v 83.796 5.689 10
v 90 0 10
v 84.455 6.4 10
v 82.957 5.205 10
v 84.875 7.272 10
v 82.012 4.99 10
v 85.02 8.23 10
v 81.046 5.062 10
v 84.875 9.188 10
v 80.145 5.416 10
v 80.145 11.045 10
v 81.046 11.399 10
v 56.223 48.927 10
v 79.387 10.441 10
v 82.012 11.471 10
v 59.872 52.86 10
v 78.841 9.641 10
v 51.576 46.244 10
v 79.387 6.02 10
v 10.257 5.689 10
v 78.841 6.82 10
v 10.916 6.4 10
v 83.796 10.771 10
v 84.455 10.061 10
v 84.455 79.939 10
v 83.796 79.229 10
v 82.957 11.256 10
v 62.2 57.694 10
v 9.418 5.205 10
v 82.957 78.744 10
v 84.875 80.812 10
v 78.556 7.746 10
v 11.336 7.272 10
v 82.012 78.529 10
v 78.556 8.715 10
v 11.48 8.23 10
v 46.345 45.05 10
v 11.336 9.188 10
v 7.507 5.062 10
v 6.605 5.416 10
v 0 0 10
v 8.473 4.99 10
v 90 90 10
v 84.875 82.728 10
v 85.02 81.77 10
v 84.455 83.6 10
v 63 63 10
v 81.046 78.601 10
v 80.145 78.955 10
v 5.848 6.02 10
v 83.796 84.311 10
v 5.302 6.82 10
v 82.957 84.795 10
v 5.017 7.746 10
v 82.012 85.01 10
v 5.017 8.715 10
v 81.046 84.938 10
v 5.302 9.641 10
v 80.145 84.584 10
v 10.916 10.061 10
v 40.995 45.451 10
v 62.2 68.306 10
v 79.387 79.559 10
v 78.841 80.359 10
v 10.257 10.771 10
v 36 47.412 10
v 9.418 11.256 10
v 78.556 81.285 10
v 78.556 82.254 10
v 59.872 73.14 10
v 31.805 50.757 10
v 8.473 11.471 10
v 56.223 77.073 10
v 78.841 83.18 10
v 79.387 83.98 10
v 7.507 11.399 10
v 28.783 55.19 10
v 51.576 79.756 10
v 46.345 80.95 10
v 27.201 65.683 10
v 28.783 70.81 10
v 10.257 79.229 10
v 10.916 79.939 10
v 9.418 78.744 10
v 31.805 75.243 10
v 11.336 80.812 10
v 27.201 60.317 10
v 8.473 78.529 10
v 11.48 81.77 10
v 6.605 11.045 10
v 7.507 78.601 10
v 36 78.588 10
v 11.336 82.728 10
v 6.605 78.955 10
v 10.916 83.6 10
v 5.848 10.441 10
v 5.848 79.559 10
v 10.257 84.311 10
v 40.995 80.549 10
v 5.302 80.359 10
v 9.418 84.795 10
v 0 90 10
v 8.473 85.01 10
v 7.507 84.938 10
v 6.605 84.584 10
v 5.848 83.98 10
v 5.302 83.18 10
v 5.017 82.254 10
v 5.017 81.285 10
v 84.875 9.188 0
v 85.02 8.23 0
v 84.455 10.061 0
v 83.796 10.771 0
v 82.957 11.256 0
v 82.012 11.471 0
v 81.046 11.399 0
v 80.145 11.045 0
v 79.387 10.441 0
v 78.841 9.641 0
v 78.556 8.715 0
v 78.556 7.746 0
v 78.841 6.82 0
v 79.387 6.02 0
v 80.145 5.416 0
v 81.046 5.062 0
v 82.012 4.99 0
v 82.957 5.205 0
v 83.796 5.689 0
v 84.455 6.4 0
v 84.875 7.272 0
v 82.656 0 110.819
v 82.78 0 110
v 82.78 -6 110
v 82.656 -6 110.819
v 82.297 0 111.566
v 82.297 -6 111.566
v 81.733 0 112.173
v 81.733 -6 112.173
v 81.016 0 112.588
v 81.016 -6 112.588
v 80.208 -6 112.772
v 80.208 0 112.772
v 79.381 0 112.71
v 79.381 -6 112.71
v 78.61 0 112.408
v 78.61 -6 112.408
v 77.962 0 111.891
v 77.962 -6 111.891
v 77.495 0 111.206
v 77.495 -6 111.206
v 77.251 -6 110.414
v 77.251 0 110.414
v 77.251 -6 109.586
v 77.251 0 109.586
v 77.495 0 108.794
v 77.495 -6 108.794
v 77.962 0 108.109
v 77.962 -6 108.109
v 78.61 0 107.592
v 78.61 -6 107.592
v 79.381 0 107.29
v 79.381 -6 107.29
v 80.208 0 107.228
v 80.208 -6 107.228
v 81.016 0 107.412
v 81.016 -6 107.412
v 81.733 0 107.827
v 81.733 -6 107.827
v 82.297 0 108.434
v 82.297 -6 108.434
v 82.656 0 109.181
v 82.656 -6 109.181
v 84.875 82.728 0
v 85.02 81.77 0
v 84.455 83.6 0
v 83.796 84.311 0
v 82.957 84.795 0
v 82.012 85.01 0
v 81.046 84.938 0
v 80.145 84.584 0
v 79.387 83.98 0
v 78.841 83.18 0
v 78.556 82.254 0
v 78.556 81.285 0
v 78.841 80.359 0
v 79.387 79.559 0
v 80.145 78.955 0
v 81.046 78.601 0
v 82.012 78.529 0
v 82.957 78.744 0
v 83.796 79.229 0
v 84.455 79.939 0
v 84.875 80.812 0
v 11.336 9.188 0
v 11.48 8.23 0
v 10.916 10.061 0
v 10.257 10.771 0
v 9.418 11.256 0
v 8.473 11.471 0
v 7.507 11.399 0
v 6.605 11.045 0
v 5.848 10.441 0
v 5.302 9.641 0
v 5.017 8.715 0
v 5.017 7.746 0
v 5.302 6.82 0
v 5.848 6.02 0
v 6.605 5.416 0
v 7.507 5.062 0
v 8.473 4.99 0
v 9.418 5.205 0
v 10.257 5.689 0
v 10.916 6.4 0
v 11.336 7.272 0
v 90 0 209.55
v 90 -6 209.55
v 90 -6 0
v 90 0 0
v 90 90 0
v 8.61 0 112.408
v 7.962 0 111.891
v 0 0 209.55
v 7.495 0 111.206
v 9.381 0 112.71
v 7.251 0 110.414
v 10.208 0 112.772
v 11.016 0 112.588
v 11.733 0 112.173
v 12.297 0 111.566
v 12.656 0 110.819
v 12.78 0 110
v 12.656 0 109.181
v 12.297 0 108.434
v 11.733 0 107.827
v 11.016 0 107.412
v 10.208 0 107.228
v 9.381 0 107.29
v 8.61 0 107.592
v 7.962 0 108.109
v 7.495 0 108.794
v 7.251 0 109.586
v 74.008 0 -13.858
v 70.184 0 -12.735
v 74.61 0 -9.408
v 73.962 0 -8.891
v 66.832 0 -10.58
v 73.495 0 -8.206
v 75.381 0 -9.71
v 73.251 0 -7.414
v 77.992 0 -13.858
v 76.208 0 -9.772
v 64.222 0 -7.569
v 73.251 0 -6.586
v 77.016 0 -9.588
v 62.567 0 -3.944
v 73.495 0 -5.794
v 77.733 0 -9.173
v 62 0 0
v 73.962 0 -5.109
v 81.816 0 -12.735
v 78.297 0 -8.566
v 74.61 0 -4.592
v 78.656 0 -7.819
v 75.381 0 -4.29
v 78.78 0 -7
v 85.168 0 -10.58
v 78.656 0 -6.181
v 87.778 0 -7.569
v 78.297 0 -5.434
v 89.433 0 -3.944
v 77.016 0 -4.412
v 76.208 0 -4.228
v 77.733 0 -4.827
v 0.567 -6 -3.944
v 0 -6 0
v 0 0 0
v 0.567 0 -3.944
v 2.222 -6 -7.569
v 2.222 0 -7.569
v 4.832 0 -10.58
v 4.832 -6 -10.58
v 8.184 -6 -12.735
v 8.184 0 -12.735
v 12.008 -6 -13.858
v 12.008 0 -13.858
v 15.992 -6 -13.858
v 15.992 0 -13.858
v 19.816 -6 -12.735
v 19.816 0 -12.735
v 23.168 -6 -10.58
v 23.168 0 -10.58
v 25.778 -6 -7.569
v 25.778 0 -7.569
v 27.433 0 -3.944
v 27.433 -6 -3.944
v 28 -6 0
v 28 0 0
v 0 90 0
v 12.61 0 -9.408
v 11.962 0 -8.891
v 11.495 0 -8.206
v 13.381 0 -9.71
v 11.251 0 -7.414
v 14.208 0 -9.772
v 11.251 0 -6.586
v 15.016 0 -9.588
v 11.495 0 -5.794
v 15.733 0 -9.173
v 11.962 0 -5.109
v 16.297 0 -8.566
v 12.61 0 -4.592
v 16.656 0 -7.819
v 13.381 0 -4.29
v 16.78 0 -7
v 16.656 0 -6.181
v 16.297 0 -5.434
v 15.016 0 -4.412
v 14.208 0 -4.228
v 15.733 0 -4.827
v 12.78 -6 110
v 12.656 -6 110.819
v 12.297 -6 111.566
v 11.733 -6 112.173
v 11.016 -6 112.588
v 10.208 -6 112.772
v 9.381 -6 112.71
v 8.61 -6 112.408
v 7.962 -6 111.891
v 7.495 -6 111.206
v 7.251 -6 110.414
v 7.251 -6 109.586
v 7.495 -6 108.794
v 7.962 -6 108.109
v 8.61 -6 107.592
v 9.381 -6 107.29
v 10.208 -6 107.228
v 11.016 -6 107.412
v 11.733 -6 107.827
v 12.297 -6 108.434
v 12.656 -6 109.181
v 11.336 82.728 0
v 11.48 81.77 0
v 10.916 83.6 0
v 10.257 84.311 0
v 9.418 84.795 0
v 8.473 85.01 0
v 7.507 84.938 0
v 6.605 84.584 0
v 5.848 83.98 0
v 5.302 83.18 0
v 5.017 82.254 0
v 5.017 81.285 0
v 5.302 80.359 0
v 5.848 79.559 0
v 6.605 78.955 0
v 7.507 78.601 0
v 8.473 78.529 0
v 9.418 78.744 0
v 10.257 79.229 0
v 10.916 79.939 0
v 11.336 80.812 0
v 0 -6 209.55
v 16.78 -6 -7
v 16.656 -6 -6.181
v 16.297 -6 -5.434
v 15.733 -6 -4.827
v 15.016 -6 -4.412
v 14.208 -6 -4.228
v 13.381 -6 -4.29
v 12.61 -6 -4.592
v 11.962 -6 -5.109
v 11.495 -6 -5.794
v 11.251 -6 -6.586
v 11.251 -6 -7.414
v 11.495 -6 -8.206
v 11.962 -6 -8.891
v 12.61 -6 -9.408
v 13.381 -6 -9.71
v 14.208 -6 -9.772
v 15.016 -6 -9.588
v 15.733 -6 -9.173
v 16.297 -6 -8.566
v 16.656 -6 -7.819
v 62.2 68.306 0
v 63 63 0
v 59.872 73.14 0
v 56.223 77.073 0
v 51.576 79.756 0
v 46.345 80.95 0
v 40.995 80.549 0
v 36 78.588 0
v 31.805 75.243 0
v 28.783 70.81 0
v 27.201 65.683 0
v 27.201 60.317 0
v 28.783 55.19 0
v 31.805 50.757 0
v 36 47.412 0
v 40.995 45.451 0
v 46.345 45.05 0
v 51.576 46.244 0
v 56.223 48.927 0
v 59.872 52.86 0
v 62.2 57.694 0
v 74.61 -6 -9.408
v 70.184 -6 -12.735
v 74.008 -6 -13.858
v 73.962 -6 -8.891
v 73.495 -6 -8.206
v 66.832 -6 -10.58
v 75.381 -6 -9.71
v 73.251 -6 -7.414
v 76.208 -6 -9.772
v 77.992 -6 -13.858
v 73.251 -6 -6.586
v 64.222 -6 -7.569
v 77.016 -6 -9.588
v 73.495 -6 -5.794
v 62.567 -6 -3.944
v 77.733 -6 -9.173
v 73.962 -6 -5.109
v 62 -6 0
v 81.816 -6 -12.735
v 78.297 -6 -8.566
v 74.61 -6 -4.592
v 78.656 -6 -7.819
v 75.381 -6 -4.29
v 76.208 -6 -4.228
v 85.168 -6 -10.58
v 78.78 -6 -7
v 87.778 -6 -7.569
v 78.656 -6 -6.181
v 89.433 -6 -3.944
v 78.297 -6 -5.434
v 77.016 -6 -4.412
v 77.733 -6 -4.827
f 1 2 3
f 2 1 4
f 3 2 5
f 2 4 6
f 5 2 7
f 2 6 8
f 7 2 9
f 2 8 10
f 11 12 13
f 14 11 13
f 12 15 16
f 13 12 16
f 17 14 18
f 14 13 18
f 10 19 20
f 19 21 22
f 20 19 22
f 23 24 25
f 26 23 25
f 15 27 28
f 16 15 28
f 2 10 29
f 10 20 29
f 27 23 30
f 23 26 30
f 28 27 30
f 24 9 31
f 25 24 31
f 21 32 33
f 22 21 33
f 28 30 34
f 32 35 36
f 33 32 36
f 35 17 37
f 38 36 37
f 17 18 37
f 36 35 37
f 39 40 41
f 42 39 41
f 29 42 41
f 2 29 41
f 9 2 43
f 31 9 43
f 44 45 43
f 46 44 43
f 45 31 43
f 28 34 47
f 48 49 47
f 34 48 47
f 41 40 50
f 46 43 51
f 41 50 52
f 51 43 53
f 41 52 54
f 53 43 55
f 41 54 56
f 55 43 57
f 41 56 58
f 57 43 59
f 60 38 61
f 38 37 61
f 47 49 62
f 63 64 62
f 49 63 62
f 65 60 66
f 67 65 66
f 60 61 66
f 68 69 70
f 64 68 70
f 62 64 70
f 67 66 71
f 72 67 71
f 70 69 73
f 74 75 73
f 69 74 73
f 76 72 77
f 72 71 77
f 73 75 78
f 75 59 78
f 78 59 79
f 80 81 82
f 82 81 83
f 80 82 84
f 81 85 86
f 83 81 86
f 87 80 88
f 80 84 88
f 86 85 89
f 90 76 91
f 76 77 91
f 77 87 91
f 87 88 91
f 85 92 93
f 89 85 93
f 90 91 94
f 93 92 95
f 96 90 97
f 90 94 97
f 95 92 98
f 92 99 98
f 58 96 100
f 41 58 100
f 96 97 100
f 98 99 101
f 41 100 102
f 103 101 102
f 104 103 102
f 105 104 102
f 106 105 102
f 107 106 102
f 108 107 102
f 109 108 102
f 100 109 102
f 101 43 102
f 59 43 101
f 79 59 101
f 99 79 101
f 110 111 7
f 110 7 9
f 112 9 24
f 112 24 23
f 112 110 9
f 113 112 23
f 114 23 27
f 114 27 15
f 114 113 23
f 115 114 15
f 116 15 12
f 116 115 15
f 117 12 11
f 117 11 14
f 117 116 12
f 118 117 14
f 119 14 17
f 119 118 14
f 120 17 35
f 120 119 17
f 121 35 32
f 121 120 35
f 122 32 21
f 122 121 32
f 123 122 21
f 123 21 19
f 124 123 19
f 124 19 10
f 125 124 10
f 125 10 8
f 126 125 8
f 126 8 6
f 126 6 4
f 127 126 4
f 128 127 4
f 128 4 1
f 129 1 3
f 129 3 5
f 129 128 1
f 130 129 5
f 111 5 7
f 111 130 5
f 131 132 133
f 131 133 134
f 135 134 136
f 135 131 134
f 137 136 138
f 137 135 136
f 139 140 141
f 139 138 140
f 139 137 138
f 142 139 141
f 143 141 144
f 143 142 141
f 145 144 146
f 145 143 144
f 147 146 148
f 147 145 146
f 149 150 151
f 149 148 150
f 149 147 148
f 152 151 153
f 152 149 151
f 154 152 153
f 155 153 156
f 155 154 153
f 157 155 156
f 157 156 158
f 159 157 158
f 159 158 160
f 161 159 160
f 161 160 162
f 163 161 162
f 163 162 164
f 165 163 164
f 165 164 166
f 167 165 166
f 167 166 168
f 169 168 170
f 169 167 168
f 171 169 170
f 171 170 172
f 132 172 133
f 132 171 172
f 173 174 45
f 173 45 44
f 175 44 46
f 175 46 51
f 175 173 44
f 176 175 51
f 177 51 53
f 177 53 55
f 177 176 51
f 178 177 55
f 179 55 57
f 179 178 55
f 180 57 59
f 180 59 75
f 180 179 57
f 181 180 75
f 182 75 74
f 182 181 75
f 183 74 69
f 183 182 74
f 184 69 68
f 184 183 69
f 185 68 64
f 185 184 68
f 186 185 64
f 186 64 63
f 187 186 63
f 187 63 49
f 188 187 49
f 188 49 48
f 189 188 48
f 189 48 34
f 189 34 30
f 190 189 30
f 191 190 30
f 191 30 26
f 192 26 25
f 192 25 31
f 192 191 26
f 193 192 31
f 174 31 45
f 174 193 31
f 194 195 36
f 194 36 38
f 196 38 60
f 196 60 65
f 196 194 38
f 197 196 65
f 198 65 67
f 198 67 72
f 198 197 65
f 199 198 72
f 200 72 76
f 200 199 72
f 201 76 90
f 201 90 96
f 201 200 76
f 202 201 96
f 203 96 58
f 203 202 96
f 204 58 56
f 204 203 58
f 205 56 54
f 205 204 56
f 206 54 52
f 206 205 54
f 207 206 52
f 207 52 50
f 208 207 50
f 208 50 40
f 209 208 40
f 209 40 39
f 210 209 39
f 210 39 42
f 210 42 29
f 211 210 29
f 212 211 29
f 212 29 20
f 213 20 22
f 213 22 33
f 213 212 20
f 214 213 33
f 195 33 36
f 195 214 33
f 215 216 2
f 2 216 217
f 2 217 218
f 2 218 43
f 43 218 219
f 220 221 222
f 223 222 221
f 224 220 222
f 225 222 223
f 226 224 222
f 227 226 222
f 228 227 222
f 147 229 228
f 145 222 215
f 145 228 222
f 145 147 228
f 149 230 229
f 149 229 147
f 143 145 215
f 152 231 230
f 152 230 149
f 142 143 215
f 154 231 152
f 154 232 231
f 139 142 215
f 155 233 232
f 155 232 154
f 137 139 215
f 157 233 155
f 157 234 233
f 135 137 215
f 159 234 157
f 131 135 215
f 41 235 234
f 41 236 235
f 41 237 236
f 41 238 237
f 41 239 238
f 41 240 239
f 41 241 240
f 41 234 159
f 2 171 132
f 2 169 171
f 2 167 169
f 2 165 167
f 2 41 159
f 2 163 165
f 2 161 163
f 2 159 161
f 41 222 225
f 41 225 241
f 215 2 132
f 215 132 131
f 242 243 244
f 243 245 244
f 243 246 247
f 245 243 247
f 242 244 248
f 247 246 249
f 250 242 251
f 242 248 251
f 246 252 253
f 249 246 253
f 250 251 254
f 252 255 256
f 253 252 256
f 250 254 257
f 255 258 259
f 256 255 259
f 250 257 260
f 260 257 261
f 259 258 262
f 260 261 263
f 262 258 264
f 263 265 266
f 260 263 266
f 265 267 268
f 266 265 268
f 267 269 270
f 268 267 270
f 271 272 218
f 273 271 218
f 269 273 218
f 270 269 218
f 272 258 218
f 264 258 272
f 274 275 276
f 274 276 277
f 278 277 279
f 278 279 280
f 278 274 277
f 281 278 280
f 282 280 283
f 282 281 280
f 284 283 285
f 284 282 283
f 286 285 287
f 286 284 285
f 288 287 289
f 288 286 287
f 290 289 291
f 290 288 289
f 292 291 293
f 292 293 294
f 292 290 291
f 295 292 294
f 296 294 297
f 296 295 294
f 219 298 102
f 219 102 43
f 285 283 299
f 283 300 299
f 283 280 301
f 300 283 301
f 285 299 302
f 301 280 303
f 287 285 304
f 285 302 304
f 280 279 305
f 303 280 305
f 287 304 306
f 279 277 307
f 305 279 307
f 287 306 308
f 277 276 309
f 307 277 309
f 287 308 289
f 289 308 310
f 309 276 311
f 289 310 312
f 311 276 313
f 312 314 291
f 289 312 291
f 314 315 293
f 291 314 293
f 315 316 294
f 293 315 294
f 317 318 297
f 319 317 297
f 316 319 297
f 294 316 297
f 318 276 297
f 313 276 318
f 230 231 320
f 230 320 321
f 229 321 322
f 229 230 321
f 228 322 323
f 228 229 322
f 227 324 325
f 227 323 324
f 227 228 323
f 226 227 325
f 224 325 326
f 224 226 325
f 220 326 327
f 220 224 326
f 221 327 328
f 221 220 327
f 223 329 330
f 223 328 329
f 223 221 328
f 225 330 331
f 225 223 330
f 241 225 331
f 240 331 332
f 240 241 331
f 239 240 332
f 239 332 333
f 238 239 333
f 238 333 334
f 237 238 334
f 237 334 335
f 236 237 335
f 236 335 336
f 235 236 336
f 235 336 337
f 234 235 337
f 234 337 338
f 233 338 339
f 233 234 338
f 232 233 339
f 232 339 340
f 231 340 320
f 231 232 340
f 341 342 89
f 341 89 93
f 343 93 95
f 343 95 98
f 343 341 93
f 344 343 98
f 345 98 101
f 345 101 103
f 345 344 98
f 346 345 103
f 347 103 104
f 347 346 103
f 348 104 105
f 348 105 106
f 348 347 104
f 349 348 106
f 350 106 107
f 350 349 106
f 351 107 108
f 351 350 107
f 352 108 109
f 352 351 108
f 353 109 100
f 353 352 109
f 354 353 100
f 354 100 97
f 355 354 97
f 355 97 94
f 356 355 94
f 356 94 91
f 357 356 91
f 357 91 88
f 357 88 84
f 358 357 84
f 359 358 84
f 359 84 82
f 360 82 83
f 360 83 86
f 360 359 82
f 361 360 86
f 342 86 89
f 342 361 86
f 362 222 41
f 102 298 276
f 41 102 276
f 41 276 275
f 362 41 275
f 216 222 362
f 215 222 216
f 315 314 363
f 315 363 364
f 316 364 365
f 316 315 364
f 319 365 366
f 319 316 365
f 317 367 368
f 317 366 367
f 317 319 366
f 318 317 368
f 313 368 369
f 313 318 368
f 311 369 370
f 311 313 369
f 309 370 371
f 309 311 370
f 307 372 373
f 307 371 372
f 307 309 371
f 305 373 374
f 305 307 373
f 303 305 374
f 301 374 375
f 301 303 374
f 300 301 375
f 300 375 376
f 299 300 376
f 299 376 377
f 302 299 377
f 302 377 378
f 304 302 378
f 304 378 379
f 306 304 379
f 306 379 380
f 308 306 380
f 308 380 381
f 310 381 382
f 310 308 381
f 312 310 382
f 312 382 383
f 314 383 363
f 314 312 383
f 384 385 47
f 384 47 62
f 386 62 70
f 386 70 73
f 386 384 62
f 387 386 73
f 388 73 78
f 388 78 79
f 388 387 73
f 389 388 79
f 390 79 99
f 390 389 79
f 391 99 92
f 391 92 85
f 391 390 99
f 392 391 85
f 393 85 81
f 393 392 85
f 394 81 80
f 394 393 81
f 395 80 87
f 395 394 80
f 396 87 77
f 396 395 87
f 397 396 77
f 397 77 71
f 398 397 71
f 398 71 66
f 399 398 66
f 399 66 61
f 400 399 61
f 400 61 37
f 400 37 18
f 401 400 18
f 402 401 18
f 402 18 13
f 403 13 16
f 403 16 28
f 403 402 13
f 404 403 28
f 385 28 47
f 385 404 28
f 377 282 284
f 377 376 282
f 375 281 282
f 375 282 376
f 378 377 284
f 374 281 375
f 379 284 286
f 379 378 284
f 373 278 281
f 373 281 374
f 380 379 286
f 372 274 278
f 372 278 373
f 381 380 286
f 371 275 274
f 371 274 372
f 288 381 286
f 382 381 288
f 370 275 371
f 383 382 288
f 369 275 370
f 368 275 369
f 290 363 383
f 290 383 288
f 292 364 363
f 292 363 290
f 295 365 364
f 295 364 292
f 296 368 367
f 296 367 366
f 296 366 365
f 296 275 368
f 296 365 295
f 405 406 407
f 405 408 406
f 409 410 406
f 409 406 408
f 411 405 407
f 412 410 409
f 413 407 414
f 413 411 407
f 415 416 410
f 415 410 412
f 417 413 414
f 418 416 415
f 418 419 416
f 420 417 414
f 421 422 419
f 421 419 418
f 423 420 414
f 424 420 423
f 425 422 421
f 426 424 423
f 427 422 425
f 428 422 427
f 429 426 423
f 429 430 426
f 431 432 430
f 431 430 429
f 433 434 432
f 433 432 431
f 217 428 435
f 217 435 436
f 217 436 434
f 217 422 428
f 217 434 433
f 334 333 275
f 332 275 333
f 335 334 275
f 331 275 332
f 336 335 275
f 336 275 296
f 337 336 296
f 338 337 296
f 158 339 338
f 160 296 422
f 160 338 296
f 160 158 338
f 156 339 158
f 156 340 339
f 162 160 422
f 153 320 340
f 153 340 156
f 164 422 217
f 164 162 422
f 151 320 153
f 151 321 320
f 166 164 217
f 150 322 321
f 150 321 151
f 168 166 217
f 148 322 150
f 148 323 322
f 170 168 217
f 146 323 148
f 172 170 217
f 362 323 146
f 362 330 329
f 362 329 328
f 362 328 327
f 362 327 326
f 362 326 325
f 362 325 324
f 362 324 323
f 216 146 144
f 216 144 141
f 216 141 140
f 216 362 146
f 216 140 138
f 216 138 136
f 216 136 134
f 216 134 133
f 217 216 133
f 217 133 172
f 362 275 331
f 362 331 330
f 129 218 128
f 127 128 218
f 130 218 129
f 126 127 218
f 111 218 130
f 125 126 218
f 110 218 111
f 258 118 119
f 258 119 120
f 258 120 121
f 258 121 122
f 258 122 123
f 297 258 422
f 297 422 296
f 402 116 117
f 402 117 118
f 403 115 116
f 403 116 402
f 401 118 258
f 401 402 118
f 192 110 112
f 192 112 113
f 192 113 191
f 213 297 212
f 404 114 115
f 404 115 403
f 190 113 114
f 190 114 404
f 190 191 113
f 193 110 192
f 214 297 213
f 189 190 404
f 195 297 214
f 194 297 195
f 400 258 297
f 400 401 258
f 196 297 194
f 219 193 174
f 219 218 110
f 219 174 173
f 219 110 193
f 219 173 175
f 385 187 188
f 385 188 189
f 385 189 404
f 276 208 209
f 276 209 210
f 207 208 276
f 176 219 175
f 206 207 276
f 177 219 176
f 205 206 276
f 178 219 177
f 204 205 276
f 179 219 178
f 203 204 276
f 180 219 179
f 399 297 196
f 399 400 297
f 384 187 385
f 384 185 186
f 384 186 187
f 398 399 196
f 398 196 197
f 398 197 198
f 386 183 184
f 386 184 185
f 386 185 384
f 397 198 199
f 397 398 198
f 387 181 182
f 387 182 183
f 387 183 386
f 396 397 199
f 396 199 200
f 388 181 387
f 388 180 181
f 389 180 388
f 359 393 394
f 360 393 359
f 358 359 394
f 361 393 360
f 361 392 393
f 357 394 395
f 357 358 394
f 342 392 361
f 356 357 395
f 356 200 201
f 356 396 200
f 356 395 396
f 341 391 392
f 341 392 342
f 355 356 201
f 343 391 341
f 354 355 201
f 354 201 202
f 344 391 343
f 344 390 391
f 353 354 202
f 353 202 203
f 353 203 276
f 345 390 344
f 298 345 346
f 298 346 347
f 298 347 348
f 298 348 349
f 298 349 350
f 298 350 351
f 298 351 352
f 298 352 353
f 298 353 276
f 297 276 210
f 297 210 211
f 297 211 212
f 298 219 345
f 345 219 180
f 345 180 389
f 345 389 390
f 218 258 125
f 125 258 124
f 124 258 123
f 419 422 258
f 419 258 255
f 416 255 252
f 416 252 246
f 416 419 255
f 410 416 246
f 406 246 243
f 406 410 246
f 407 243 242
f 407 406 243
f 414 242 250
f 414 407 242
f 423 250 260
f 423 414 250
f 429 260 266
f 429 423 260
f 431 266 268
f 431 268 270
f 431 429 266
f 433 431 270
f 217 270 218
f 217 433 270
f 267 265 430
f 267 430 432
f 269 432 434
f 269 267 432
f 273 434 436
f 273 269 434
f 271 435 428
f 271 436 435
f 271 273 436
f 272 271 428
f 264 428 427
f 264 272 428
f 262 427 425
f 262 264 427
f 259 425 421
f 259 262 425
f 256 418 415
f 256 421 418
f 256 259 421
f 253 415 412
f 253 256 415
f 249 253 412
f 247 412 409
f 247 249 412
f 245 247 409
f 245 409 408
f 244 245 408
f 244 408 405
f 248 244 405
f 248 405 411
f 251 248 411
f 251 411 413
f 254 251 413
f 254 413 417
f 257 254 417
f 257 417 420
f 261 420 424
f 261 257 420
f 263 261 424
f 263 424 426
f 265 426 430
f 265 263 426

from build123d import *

# Parameters (mm, degrees)
CYLINDER_R        = 2.78
CYLINDER_DEPTH    = 10
CYLINDER001_R     = 2.78
CYLINDER001_DEPTH = 10
EXTRUDE002_DEPTH  = 6
CYLINDER003_R     = 2.78
CYLINDER003_DEPTH = 10
CYLINDER002_R     = 2.78
CYLINDER002_DEPTH = 10
SKETCH001_W       = 90
SKETCH001_H       = 6
EXTRUDE001_DEPTH  = 209.55
SKETCH_R          = 3.25
SKETCH_R_2        = 18
EXTRUDE_DEPTH     = 10


with BuildPart() as cylinder:
    # Cylinder → Cylinder (new body)
    with BuildSketch(Plane(origin=(14, 2, -7), x_dir=(1, 0, 0), z_dir=(0, -1, 0))):
        Circle(CYLINDER_R)
    extrude(amount=CYLINDER_DEPTH)


with BuildPart() as cylinder001:
    # Cylinder001 → Cylinder001 (new body)
    with BuildSketch(Plane(origin=(76, 2, -7), x_dir=(1, 0, 0), z_dir=(0, -1, 0))):
        Circle(CYLINDER001_R)
    extrude(amount=CYLINDER001_DEPTH)


with BuildPart() as cut001:
    # Sketch002 (on Face1 of Extrude001) → Extrude002 (new body)
    with BuildSketch(Plane.XZ.offset(6)):
        with BuildLine():
            ThreePointArc((0, 0), (14, -14), (28, 0))
            Line((0, 0), (28, 0))
        make_face()
        with BuildLine():
            ThreePointArc((62, 0), (76, -14), (90, 0))
            Line((62, 0), (90, 0))
        make_face()
    extrude(amount=-EXTRUDE002_DEPTH)

    # Cut: cut Cylinder001
    add(cylinder001.part, mode=Mode.SUBTRACT)

    # Cut001: cut Cylinder
    add(cylinder.part, mode=Mode.SUBTRACT)


with BuildPart() as cylinder003:
    # Cylinder003 → Cylinder003 (new body)
    with BuildSketch(Plane(origin=(80, 2, 110), x_dir=(1, 0, 0), z_dir=(0, -1, 0))):
        Circle(CYLINDER003_R)
    extrude(amount=CYLINDER003_DEPTH)


with BuildPart() as cylinder002:
    # Cylinder002 → Cylinder002 (new body)
    with BuildSketch(Plane(origin=(10, 2, 110), x_dir=(1, 0, 0), z_dir=(0, -1, 0))):
        Circle(CYLINDER002_R)
    extrude(amount=CYLINDER002_DEPTH)


with BuildPart() as cut003:
    # Sketch001 (on Sketch) → Extrude001 (new body)
    with BuildSketch(Plane.XY):
        with Locations((45, -3)):
            Rectangle(SKETCH001_W, SKETCH001_H)
    extrude(amount=EXTRUDE001_DEPTH)

    # Cut002: cut Cylinder002
    add(cylinder002.part, mode=Mode.SUBTRACT)

    # Cut003: cut Cylinder003
    add(cylinder003.part, mode=Mode.SUBTRACT)


with BuildPart() as fusion:
    # Sketch → Extrude (new body)
    with BuildSketch(Plane.XY):
        Polygon((0, 0), (0, 90), (90, 90), (90, 0), (90, -6), (0, -6), align=None)
        with Locations((8.230447, 81.769553)):
            Circle(SKETCH_R, mode=Mode.SUBTRACT)
        with Locations((81.769553, 81.769553)):
            Circle(SKETCH_R, mode=Mode.SUBTRACT)
        with Locations((81.769553, 8.230447)):
            Circle(SKETCH_R, mode=Mode.SUBTRACT)
        with Locations((8.230447, 8.230447)):
            Circle(SKETCH_R, mode=Mode.SUBTRACT)
        with Locations((45, 63)):
            Circle(SKETCH_R_2, mode=Mode.SUBTRACT)
    extrude(amount=EXTRUDE_DEPTH)

    # Fusion: union Cut001, Cut003
    add(cut001.part)
    add(cut003.part)


solid = fusion.part
